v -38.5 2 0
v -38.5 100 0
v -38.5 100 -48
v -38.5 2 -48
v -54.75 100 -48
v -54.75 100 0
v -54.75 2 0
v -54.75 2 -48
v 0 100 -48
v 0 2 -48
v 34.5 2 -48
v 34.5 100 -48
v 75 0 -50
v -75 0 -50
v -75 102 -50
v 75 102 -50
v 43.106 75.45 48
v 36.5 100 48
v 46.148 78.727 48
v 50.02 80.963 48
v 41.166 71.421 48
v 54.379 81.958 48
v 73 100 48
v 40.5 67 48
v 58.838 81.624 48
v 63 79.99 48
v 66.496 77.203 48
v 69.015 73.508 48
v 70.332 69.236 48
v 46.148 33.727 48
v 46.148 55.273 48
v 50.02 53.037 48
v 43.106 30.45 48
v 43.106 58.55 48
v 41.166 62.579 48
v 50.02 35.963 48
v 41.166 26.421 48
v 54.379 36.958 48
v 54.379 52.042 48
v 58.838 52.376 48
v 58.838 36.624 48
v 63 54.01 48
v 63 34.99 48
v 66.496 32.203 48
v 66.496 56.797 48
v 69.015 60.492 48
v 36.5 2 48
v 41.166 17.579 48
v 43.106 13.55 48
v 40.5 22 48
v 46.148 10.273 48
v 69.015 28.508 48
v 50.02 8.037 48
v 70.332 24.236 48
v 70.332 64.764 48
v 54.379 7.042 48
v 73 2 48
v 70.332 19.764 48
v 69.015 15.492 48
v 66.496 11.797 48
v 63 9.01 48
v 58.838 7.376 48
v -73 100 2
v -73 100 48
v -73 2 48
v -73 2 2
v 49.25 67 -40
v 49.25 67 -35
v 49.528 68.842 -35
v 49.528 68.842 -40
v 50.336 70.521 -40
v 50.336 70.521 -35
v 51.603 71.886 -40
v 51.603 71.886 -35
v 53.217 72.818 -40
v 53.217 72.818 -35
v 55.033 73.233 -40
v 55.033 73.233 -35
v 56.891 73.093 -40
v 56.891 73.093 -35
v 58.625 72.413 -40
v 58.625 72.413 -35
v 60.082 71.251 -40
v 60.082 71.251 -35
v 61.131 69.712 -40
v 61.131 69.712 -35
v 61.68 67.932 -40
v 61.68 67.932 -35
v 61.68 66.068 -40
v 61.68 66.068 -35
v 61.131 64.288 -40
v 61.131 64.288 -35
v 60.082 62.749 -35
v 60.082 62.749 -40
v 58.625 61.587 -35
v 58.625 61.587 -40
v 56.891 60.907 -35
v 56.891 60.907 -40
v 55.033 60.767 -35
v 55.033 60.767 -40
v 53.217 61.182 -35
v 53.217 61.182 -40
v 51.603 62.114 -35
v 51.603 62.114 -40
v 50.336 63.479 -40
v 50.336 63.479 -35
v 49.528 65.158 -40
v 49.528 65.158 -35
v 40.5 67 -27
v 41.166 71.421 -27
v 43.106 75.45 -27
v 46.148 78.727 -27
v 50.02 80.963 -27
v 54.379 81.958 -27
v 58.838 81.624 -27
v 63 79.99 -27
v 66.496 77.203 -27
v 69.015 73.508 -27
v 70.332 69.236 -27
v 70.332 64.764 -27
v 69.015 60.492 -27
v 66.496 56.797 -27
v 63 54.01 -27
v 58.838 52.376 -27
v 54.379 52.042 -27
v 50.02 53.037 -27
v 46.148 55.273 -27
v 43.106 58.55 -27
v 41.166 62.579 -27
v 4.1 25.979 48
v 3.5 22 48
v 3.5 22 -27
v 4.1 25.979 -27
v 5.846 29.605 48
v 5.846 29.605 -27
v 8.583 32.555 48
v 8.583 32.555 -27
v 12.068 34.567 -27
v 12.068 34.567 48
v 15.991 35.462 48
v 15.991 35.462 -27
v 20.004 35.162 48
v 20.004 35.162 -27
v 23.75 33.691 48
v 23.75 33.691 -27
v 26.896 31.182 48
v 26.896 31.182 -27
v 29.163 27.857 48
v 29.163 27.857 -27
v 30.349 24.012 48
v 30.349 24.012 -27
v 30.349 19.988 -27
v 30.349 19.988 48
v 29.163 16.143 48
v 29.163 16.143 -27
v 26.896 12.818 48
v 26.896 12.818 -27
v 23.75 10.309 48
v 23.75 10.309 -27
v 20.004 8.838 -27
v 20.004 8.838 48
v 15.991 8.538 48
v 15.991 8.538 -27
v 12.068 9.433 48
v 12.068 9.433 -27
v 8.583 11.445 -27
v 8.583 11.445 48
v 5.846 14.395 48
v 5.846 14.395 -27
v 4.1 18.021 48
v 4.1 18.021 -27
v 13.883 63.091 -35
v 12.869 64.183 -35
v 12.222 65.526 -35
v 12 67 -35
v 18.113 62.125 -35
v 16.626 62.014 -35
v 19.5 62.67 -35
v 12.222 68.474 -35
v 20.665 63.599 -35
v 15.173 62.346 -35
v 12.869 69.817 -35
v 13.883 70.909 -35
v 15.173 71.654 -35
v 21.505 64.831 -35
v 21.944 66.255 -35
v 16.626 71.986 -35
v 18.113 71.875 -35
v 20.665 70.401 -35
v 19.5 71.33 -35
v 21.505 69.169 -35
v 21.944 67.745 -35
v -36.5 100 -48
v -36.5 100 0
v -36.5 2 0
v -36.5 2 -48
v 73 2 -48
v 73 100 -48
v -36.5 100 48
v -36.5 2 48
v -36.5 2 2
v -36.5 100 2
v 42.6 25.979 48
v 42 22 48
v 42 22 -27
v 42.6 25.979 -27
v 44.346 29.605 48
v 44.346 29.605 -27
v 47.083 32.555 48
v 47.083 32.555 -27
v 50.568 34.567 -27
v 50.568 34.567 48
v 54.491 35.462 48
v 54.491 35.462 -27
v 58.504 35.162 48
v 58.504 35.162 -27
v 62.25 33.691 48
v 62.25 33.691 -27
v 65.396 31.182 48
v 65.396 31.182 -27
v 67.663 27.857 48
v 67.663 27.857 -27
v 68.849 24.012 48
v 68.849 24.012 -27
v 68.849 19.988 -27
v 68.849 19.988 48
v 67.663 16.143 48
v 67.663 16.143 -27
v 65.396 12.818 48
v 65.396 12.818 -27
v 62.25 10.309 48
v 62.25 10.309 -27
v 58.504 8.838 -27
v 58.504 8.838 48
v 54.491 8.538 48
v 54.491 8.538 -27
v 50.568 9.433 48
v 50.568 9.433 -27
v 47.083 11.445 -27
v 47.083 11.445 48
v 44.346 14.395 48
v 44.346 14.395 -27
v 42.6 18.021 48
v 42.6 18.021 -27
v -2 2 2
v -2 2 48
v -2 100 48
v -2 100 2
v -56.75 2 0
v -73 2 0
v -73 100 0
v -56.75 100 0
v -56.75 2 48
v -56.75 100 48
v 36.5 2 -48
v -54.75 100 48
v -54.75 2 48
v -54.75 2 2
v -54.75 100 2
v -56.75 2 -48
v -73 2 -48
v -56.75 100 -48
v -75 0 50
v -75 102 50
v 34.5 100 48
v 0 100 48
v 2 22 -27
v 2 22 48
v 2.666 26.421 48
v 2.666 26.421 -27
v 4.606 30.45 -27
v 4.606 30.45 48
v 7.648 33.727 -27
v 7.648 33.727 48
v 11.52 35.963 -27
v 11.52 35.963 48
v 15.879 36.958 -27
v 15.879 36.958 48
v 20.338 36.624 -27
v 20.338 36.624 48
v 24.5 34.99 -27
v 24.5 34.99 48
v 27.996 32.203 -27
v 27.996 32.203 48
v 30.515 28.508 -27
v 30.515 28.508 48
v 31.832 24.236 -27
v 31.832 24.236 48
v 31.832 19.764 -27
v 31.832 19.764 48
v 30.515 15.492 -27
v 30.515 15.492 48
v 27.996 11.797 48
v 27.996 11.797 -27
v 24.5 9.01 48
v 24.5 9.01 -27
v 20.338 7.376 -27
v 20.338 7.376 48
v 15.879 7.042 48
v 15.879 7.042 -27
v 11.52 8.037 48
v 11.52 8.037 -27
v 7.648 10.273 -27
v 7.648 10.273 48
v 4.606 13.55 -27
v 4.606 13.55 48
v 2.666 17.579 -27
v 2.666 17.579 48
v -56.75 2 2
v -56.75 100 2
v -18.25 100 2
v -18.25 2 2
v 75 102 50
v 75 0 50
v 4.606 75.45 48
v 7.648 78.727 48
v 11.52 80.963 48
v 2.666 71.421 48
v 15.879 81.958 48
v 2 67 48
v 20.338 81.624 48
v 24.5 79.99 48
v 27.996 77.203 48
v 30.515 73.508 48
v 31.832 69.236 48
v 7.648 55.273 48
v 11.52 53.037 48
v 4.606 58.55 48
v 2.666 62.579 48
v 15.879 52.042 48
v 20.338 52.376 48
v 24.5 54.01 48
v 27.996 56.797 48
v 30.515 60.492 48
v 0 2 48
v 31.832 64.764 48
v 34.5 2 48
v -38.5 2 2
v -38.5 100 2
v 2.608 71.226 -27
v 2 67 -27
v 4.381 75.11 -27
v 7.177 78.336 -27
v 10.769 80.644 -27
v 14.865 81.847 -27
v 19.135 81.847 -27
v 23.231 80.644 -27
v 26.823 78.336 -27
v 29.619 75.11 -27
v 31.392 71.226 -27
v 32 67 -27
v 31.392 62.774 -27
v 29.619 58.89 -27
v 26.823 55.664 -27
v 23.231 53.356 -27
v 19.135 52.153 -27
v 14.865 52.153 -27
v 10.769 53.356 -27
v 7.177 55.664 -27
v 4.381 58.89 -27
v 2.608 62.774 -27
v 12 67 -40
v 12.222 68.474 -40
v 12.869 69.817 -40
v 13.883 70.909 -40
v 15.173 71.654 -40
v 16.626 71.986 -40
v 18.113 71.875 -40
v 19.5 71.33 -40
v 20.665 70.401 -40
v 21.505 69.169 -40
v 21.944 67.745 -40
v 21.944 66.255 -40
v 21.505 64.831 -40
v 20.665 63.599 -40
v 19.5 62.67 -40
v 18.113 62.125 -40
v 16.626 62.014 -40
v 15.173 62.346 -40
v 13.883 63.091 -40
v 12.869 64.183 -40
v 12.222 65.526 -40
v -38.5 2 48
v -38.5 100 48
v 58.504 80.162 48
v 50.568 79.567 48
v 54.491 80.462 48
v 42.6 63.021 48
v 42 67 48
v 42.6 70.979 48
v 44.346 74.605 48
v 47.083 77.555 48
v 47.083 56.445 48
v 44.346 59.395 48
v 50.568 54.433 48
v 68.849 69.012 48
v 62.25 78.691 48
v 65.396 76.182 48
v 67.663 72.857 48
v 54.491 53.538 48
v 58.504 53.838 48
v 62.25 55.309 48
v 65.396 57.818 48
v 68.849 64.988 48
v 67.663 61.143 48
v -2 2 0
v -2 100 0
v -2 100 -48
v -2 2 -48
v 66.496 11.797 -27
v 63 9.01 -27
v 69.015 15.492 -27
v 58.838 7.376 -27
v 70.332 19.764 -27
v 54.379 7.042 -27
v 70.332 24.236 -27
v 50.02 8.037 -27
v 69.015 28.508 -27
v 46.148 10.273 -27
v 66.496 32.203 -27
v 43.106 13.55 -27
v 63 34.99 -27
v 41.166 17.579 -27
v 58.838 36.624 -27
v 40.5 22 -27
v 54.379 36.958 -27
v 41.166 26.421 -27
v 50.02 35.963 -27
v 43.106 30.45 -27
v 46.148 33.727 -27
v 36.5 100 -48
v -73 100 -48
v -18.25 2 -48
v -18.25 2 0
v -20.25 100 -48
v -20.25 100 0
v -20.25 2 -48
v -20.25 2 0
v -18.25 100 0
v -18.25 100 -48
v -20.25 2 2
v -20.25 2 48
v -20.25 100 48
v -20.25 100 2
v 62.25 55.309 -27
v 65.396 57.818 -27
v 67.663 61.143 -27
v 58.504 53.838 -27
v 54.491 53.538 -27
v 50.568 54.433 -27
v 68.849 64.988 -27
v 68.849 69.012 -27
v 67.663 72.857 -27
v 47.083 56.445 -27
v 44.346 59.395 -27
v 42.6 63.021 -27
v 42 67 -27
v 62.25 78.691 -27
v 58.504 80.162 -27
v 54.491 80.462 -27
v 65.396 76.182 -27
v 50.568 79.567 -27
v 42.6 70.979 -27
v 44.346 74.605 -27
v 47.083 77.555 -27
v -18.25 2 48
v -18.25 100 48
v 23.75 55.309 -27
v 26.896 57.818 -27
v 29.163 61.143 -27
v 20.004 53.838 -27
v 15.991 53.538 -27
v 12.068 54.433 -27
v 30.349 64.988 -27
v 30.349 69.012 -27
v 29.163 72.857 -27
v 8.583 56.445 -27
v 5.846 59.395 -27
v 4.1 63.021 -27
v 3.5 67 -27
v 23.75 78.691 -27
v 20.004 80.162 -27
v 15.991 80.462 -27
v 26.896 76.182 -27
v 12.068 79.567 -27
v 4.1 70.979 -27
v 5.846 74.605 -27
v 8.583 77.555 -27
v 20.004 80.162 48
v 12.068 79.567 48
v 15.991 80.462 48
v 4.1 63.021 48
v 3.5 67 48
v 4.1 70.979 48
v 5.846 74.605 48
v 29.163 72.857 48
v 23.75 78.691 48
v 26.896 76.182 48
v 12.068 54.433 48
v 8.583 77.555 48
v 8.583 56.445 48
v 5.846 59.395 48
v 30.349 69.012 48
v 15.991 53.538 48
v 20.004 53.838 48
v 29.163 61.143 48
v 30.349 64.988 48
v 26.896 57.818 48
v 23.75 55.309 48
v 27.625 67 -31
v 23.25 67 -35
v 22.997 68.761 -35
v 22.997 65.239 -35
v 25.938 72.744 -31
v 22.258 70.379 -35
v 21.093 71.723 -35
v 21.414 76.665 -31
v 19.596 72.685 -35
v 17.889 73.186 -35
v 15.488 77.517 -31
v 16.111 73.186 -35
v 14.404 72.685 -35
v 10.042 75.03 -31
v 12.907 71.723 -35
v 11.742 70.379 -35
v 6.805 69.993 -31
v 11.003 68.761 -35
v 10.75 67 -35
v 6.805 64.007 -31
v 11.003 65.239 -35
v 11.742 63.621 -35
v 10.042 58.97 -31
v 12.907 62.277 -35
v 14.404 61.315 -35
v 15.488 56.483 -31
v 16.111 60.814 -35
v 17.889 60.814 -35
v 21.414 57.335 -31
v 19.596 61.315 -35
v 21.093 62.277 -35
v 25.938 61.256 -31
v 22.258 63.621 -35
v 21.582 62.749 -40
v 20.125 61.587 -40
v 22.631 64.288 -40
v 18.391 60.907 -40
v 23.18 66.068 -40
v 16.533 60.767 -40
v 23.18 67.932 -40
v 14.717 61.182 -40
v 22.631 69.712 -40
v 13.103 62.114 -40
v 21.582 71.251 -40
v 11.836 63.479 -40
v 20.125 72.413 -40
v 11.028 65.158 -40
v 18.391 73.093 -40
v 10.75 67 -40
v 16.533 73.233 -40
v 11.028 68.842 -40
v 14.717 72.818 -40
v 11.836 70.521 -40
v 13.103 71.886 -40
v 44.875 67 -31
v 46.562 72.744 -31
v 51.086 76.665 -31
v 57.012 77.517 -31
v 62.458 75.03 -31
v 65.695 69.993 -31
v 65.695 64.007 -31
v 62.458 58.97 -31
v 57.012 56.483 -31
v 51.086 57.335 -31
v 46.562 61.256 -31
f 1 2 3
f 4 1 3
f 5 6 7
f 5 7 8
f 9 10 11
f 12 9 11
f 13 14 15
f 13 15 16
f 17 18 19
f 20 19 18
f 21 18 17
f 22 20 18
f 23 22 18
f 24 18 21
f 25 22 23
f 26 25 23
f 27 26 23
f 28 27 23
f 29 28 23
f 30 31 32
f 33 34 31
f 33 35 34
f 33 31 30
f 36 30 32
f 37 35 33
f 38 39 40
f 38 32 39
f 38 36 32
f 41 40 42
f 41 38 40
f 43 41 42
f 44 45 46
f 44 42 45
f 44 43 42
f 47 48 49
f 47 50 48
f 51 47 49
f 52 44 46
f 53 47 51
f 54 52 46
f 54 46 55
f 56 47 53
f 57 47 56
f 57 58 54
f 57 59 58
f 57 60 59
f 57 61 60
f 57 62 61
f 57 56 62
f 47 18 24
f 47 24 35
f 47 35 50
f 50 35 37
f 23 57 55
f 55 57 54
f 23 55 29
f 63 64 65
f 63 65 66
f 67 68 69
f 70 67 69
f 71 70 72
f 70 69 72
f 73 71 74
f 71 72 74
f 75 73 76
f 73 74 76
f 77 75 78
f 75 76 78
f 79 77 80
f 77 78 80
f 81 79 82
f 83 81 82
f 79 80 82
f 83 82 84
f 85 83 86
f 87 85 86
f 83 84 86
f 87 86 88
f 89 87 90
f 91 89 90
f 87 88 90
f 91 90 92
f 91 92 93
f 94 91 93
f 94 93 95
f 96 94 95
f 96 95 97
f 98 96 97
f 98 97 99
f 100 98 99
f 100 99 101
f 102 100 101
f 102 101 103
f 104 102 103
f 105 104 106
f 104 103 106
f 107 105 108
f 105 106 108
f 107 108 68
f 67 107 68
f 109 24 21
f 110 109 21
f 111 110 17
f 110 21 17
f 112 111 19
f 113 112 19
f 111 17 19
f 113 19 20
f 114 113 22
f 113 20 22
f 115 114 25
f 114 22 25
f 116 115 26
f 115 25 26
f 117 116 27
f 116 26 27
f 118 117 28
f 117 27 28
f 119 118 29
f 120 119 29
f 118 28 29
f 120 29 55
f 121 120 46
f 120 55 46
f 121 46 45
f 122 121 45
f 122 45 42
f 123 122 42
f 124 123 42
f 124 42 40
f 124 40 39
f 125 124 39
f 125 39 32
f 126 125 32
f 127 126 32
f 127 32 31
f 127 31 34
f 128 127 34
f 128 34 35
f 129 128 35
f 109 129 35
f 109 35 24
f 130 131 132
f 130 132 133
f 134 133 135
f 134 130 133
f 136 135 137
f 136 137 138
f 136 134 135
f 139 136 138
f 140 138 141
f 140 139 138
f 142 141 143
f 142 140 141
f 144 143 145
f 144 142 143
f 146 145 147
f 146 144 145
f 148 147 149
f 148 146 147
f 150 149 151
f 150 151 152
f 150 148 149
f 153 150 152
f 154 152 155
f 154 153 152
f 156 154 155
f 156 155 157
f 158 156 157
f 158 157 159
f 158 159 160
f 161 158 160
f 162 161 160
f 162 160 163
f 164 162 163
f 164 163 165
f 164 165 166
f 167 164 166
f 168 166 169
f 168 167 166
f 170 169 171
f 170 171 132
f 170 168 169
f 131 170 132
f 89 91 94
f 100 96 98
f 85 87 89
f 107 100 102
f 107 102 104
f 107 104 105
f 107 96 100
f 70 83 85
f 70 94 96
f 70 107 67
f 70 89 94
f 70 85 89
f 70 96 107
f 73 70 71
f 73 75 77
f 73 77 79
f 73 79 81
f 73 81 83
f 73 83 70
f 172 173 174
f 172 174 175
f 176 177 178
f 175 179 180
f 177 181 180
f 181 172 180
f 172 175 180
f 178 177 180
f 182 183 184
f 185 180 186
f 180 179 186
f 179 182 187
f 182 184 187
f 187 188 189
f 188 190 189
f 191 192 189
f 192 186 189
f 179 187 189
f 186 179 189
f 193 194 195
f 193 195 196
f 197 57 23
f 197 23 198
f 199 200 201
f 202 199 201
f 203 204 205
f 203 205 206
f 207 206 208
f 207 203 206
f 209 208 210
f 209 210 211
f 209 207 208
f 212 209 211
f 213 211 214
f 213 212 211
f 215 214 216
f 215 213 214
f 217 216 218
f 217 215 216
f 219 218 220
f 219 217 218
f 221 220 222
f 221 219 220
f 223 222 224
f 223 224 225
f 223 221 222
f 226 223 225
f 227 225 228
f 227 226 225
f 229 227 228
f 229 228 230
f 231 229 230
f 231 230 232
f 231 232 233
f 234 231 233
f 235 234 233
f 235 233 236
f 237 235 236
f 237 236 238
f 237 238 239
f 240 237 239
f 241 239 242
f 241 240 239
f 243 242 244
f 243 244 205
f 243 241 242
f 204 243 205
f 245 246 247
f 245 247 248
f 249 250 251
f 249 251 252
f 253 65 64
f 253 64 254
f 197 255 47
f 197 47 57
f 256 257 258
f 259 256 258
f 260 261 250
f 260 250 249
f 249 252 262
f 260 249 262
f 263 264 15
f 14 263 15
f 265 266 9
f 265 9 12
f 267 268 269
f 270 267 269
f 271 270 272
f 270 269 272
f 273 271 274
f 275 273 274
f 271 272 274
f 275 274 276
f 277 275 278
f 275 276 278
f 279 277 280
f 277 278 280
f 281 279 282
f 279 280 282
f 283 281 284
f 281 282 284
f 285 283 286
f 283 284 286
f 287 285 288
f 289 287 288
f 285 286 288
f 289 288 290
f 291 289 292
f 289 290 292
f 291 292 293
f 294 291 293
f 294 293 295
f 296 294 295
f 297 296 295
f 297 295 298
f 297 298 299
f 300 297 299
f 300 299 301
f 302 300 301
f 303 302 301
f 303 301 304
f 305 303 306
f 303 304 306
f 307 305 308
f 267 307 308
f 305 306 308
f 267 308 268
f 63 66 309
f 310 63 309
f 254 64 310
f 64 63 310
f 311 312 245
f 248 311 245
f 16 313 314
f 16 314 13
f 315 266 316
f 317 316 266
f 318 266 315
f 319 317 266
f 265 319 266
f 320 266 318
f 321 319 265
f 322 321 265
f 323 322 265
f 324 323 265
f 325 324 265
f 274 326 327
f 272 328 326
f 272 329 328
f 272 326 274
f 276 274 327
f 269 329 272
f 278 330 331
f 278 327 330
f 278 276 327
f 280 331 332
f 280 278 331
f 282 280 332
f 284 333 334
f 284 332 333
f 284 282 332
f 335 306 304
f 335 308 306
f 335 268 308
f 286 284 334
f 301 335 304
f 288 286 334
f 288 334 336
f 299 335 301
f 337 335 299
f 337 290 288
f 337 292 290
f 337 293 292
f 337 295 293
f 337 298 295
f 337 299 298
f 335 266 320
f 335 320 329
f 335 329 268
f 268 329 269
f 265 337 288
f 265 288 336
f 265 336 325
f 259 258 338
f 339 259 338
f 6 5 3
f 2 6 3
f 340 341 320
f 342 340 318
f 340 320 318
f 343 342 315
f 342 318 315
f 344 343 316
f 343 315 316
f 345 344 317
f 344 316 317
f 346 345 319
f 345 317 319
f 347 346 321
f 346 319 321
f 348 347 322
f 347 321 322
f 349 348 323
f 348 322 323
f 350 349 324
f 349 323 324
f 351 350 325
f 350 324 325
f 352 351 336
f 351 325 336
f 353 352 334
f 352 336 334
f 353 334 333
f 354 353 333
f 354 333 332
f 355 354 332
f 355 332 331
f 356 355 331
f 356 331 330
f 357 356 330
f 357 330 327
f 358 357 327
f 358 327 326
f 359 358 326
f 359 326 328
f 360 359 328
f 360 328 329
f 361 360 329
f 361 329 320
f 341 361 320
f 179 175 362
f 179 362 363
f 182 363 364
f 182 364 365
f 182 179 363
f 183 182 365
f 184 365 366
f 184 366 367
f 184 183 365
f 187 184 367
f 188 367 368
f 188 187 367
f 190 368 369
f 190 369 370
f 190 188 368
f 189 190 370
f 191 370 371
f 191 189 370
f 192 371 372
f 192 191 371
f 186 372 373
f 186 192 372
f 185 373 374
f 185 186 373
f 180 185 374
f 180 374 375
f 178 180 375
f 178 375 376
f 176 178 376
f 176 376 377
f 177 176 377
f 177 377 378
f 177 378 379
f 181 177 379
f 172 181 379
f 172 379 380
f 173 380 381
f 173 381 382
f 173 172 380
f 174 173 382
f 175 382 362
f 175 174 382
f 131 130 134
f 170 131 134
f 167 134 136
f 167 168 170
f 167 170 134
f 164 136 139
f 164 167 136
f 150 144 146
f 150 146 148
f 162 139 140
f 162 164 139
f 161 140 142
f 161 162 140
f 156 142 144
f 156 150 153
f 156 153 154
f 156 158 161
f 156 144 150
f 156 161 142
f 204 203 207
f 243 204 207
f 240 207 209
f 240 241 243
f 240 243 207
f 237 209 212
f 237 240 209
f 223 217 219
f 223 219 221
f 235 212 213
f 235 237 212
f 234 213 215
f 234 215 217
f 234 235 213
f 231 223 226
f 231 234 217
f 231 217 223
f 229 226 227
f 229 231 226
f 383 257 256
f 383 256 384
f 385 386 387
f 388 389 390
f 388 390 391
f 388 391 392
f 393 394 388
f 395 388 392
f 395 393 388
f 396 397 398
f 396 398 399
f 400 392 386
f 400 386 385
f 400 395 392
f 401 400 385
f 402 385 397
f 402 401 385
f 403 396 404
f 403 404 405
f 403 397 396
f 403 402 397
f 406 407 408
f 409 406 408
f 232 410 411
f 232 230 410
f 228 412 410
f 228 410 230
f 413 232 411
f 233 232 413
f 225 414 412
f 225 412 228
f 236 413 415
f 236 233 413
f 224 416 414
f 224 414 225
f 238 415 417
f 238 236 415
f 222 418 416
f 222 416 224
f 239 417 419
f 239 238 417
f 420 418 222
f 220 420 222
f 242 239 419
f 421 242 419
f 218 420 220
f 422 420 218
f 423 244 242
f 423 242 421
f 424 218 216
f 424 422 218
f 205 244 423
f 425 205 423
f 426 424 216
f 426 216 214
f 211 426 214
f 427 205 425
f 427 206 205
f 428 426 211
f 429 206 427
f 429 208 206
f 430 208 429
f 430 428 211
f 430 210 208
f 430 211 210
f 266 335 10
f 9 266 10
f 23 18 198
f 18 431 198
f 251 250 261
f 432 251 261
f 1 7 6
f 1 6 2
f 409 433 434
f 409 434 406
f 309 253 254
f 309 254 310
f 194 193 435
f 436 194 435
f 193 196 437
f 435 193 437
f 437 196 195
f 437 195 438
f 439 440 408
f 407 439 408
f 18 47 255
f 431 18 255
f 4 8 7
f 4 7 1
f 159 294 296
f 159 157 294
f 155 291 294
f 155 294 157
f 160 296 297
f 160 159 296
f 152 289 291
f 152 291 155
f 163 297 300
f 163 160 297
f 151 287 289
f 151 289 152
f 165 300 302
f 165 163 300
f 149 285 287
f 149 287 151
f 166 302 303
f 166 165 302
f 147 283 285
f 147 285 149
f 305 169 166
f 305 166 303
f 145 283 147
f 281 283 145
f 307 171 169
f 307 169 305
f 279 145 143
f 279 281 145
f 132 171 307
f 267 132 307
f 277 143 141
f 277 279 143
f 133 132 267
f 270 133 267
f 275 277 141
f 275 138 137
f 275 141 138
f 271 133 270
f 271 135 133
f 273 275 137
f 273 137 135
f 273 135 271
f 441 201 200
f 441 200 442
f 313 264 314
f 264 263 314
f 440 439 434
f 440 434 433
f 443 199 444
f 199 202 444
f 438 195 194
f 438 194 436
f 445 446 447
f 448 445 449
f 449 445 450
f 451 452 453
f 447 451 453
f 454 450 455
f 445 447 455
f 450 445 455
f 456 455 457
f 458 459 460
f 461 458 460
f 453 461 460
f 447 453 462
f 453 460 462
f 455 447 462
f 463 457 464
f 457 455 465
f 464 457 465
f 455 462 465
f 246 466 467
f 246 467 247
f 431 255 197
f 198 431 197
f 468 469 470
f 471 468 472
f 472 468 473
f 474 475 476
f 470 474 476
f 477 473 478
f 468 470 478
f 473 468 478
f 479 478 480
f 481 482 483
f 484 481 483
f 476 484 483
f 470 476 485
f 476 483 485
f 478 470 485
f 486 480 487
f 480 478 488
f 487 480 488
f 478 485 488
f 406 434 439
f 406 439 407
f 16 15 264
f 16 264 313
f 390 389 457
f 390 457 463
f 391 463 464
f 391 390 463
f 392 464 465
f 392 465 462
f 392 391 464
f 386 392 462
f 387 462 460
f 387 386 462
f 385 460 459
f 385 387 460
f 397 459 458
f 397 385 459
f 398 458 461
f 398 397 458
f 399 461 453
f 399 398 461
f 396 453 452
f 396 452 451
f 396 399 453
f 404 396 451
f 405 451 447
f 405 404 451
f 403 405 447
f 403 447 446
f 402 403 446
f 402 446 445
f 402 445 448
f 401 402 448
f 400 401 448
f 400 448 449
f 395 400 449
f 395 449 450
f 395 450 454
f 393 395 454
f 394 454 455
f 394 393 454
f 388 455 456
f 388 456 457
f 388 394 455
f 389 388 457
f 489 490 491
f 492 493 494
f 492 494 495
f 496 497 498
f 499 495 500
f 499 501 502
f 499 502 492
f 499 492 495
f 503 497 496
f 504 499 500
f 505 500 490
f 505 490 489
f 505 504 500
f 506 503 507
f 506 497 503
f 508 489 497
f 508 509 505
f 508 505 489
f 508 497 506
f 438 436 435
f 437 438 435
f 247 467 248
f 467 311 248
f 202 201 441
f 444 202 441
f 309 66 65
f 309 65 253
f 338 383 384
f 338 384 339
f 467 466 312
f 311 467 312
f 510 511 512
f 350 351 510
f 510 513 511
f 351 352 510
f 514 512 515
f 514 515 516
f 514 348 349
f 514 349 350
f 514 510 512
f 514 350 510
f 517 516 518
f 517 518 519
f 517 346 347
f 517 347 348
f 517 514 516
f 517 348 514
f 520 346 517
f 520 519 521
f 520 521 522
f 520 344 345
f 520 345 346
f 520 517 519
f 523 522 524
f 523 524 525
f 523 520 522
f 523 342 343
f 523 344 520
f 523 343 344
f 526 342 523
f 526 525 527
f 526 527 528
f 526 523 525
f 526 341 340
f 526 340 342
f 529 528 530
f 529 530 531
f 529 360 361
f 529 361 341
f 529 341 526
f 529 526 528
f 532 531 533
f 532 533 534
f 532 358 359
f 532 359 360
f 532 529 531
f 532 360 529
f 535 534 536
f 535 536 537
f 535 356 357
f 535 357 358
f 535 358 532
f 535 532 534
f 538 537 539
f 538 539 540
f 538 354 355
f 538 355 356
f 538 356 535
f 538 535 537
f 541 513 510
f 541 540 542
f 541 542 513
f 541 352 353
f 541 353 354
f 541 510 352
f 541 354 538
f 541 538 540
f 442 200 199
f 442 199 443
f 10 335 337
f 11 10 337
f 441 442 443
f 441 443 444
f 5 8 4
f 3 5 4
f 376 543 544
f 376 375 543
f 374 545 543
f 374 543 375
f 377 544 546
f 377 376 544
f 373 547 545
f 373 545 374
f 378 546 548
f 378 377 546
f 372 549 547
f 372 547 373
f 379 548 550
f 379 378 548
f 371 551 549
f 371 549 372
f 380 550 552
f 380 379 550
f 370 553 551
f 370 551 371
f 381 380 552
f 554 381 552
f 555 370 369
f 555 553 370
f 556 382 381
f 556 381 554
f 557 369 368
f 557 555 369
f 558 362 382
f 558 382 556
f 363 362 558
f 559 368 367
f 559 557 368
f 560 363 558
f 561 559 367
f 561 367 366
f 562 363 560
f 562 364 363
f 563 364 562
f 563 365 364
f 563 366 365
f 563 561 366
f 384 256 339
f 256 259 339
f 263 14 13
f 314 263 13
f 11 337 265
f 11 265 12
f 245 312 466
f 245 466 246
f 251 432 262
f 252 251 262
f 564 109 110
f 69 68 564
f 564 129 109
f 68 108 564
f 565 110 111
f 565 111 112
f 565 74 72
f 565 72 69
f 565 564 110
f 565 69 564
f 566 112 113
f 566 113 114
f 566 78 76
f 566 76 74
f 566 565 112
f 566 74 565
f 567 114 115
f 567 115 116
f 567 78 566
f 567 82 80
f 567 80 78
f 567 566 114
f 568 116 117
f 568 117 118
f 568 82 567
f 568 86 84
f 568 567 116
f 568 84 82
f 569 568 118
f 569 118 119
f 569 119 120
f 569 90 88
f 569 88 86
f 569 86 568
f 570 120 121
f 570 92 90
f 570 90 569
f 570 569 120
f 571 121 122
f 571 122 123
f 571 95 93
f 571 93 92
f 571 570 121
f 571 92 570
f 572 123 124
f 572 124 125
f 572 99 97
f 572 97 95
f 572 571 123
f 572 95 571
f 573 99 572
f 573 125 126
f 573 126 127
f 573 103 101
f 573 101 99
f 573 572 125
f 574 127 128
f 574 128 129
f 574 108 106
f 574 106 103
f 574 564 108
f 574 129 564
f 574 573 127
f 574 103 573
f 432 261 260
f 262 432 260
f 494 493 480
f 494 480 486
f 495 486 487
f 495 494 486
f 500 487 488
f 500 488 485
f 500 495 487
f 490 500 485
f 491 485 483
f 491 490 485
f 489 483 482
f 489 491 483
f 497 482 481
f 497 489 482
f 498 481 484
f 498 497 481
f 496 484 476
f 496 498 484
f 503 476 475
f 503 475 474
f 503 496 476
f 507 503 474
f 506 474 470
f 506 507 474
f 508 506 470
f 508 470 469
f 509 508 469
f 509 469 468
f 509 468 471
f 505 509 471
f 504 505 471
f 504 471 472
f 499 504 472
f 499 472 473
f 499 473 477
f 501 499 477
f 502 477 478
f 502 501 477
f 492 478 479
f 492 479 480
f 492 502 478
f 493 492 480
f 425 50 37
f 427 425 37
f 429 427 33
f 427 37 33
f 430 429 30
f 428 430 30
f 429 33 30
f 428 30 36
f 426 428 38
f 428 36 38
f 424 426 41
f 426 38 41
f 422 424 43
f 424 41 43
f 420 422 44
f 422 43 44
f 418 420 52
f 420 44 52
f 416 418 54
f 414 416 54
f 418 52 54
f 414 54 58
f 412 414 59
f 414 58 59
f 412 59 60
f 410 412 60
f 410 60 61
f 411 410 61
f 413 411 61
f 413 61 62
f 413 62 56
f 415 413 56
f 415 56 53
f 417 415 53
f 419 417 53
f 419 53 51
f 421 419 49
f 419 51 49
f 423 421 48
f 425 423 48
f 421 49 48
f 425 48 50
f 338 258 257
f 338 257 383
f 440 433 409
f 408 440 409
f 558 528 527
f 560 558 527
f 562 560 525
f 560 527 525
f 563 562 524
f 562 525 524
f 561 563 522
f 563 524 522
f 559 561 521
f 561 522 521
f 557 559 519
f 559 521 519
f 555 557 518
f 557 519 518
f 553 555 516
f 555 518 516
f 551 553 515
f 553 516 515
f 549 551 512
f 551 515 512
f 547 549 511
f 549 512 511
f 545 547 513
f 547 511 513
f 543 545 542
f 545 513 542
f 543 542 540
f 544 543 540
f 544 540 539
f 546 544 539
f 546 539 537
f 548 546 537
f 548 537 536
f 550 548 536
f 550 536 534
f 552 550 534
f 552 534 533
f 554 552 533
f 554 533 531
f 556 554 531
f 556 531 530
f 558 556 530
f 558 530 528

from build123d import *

# Parameters (mm, degrees)
SKETCH1_W           = 150
SKETCH1_H           = 100
BOSS_EXTRUDE1_DEPTH = 100
SHELL1_T            = -2
SKETCH3_W           = 73
SKETCH3_H           = 2
SKETCH3_W_2         = 2
SKETCH3_H_2         = 96
EXTRUDE_THIN1_DEPTH = 98
SKETCH4_R           = 15
SKETCH4_R_2         = 13.5
BOSS_EXTRUDE2_DEPTH = 75
SKETCH6_R           = 6.25
SKETCH7_R           = 6.25
SKETCH11_R          = 6.25
SKETCH11_R_2        = 5
BOSS_EXTRUDE3_DEPTH = 5
SKETCH12_R          = 6.25
BOSS_EXTRUDE4_DEPTH = 5
SKETCH13_W          = 150
SKETCH13_H          = 100
BOSS_EXTRUDE5_DEPTH = 2


with BuildPart() as part:
    # Sketch1 → Boss-Extrude1 (new body)
    with BuildSketch(Plane(origin=(0, 0, 0), x_dir=(1, 0, 0), z_dir=(0, 1, 0))):
        Rectangle(SKETCH1_W, SKETCH1_H)
    extrude(amount=BOSS_EXTRUDE1_DEPTH)

    # Shell1
    shell1_openings = [part.faces().sort_by_distance(p)[0] for p in [
        (0, 100, 0),
    ]]
    offset(amount=SHELL1_T, openings=shell1_openings, kind=Kind.INTERSECTION)

    # Sketch3 → Extrude-Thin1 (add, through all)
    with BuildSketch(Plane(origin=(0, 2, 0), x_dir=(1, 0, 0), z_dir=(0, 1, 0))):
        with Locations((-36.5, -1)):
            Rectangle(SKETCH3_W, SKETCH3_H)
        with Locations((-55.75, 0)):
            Rectangle(SKETCH3_W_2, SKETCH3_H_2)
        with Locations((-37.5, 0)):
            Rectangle(SKETCH3_W_2, SKETCH3_H_2)
        with Locations((-1, 0)):
            Rectangle(SKETCH3_W_2, SKETCH3_H_2)
        with Locations((-19.25, 0)):
            Rectangle(SKETCH3_W_2, SKETCH3_H_2)
        with Locations((35.5, 0)):
            Rectangle(SKETCH3_W_2, SKETCH3_H_2)
    extrude(amount=EXTRUDE_THIN1_DEPTH)

    # Sketch4 → Boss-Extrude2 (add)
    # profile 1 of 4: a face of its own
    with BuildSketch(Plane(origin=(0, 0, 48), x_dir=(-1, 0, 0), z_dir=(0, 0, -1))):
        with Locations((-17, 67)):
            Circle(SKETCH4_R)
        with Locations((-17, 67)):
            Circle(SKETCH4_R_2, mode=Mode.SUBTRACT)
    # profile 2 of 4: a face of its own
    with BuildSketch(Plane(origin=(0, 0, 48), x_dir=(-1, 0, 0), z_dir=(0, 0, -1))):
        with Locations((-55.5, 67)):
            Circle(SKETCH4_R)
        with Locations((-55.5, 67)):
            Circle(SKETCH4_R_2, mode=Mode.SUBTRACT)
    # profile 3 of 4: a face of its own
    with BuildSketch(Plane(origin=(0, 0, 48), x_dir=(-1, 0, 0), z_dir=(0, 0, -1))):
        with Locations((-17, 22)):
            Circle(SKETCH4_R)
        with Locations((-17, 22)):
            Circle(SKETCH4_R_2, mode=Mode.SUBTRACT)
    # profile 4 of 4: a face of its own
    with BuildSketch(Plane(origin=(0, 0, 48), x_dir=(-1, 0, 0), z_dir=(0, 0, -1))):
        with Locations((-55.5, 22)):
            Circle(SKETCH4_R)
        with Locations((-55.5, 22)):
            Circle(SKETCH4_R_2, mode=Mode.SUBTRACT)
    extrude(amount=BOSS_EXTRUDE2_DEPTH)

    # Sketch6 → section 0 of loft2
    with BuildSketch(Plane.XY.offset(-35), mode=Mode.PRIVATE) as loft2_s0:
        with Locations((17, 67)):
            Circle(SKETCH6_R)
    # loft up to a face of the part (loft2)
    loft([loft2_s0.sketch, Face(Wire([part.edges().sort_by_distance((27.268206589, 77.934529411, -27))[0]]))])

    # Sketch7 → section 1 of loft3
    with BuildSketch(Plane.XY.offset(-35), mode=Mode.PRIVATE) as loft3_s1:
        with Locations((55.5, 67)):
            Circle(SKETCH7_R)
    # loft up to a face of the part (loft3)
    loft([Face(Wire([part.edges().sort_by_distance((65.768206589, 77.934529411, -27))[0]])), loft3_s1.sketch])

    # Sketch11 → Boss-Extrude3 (add)
    with BuildSketch(Plane(origin=(0, 0, -35), x_dir=(-1, 0, 0), z_dir=(0, 0, -1))):
        with Locations((-17, 67)):
            Circle(SKETCH11_R)
        with Locations((-17, 67)):
            Circle(SKETCH11_R_2, mode=Mode.SUBTRACT)
    extrude(amount=BOSS_EXTRUDE3_DEPTH)

    # Sketch12 → Boss-Extrude4 (add)
    with BuildSketch(Plane(origin=(0, 0, -35), x_dir=(-1, 0, 0), z_dir=(0, 0, -1))):
        with Locations((-55.5, 67)):
            Circle(SKETCH12_R)
    extrude(amount=BOSS_EXTRUDE4_DEPTH)

    # Sketch13 → Boss-Extrude5 (add)
    with BuildSketch(Plane(origin=(0, 100, 0), x_dir=(1, 0, 0), z_dir=(0, 1, 0))):
        Rectangle(SKETCH13_W, SKETCH13_H)
    extrude(amount=BOSS_EXTRUDE5_DEPTH)


solid = part.part
